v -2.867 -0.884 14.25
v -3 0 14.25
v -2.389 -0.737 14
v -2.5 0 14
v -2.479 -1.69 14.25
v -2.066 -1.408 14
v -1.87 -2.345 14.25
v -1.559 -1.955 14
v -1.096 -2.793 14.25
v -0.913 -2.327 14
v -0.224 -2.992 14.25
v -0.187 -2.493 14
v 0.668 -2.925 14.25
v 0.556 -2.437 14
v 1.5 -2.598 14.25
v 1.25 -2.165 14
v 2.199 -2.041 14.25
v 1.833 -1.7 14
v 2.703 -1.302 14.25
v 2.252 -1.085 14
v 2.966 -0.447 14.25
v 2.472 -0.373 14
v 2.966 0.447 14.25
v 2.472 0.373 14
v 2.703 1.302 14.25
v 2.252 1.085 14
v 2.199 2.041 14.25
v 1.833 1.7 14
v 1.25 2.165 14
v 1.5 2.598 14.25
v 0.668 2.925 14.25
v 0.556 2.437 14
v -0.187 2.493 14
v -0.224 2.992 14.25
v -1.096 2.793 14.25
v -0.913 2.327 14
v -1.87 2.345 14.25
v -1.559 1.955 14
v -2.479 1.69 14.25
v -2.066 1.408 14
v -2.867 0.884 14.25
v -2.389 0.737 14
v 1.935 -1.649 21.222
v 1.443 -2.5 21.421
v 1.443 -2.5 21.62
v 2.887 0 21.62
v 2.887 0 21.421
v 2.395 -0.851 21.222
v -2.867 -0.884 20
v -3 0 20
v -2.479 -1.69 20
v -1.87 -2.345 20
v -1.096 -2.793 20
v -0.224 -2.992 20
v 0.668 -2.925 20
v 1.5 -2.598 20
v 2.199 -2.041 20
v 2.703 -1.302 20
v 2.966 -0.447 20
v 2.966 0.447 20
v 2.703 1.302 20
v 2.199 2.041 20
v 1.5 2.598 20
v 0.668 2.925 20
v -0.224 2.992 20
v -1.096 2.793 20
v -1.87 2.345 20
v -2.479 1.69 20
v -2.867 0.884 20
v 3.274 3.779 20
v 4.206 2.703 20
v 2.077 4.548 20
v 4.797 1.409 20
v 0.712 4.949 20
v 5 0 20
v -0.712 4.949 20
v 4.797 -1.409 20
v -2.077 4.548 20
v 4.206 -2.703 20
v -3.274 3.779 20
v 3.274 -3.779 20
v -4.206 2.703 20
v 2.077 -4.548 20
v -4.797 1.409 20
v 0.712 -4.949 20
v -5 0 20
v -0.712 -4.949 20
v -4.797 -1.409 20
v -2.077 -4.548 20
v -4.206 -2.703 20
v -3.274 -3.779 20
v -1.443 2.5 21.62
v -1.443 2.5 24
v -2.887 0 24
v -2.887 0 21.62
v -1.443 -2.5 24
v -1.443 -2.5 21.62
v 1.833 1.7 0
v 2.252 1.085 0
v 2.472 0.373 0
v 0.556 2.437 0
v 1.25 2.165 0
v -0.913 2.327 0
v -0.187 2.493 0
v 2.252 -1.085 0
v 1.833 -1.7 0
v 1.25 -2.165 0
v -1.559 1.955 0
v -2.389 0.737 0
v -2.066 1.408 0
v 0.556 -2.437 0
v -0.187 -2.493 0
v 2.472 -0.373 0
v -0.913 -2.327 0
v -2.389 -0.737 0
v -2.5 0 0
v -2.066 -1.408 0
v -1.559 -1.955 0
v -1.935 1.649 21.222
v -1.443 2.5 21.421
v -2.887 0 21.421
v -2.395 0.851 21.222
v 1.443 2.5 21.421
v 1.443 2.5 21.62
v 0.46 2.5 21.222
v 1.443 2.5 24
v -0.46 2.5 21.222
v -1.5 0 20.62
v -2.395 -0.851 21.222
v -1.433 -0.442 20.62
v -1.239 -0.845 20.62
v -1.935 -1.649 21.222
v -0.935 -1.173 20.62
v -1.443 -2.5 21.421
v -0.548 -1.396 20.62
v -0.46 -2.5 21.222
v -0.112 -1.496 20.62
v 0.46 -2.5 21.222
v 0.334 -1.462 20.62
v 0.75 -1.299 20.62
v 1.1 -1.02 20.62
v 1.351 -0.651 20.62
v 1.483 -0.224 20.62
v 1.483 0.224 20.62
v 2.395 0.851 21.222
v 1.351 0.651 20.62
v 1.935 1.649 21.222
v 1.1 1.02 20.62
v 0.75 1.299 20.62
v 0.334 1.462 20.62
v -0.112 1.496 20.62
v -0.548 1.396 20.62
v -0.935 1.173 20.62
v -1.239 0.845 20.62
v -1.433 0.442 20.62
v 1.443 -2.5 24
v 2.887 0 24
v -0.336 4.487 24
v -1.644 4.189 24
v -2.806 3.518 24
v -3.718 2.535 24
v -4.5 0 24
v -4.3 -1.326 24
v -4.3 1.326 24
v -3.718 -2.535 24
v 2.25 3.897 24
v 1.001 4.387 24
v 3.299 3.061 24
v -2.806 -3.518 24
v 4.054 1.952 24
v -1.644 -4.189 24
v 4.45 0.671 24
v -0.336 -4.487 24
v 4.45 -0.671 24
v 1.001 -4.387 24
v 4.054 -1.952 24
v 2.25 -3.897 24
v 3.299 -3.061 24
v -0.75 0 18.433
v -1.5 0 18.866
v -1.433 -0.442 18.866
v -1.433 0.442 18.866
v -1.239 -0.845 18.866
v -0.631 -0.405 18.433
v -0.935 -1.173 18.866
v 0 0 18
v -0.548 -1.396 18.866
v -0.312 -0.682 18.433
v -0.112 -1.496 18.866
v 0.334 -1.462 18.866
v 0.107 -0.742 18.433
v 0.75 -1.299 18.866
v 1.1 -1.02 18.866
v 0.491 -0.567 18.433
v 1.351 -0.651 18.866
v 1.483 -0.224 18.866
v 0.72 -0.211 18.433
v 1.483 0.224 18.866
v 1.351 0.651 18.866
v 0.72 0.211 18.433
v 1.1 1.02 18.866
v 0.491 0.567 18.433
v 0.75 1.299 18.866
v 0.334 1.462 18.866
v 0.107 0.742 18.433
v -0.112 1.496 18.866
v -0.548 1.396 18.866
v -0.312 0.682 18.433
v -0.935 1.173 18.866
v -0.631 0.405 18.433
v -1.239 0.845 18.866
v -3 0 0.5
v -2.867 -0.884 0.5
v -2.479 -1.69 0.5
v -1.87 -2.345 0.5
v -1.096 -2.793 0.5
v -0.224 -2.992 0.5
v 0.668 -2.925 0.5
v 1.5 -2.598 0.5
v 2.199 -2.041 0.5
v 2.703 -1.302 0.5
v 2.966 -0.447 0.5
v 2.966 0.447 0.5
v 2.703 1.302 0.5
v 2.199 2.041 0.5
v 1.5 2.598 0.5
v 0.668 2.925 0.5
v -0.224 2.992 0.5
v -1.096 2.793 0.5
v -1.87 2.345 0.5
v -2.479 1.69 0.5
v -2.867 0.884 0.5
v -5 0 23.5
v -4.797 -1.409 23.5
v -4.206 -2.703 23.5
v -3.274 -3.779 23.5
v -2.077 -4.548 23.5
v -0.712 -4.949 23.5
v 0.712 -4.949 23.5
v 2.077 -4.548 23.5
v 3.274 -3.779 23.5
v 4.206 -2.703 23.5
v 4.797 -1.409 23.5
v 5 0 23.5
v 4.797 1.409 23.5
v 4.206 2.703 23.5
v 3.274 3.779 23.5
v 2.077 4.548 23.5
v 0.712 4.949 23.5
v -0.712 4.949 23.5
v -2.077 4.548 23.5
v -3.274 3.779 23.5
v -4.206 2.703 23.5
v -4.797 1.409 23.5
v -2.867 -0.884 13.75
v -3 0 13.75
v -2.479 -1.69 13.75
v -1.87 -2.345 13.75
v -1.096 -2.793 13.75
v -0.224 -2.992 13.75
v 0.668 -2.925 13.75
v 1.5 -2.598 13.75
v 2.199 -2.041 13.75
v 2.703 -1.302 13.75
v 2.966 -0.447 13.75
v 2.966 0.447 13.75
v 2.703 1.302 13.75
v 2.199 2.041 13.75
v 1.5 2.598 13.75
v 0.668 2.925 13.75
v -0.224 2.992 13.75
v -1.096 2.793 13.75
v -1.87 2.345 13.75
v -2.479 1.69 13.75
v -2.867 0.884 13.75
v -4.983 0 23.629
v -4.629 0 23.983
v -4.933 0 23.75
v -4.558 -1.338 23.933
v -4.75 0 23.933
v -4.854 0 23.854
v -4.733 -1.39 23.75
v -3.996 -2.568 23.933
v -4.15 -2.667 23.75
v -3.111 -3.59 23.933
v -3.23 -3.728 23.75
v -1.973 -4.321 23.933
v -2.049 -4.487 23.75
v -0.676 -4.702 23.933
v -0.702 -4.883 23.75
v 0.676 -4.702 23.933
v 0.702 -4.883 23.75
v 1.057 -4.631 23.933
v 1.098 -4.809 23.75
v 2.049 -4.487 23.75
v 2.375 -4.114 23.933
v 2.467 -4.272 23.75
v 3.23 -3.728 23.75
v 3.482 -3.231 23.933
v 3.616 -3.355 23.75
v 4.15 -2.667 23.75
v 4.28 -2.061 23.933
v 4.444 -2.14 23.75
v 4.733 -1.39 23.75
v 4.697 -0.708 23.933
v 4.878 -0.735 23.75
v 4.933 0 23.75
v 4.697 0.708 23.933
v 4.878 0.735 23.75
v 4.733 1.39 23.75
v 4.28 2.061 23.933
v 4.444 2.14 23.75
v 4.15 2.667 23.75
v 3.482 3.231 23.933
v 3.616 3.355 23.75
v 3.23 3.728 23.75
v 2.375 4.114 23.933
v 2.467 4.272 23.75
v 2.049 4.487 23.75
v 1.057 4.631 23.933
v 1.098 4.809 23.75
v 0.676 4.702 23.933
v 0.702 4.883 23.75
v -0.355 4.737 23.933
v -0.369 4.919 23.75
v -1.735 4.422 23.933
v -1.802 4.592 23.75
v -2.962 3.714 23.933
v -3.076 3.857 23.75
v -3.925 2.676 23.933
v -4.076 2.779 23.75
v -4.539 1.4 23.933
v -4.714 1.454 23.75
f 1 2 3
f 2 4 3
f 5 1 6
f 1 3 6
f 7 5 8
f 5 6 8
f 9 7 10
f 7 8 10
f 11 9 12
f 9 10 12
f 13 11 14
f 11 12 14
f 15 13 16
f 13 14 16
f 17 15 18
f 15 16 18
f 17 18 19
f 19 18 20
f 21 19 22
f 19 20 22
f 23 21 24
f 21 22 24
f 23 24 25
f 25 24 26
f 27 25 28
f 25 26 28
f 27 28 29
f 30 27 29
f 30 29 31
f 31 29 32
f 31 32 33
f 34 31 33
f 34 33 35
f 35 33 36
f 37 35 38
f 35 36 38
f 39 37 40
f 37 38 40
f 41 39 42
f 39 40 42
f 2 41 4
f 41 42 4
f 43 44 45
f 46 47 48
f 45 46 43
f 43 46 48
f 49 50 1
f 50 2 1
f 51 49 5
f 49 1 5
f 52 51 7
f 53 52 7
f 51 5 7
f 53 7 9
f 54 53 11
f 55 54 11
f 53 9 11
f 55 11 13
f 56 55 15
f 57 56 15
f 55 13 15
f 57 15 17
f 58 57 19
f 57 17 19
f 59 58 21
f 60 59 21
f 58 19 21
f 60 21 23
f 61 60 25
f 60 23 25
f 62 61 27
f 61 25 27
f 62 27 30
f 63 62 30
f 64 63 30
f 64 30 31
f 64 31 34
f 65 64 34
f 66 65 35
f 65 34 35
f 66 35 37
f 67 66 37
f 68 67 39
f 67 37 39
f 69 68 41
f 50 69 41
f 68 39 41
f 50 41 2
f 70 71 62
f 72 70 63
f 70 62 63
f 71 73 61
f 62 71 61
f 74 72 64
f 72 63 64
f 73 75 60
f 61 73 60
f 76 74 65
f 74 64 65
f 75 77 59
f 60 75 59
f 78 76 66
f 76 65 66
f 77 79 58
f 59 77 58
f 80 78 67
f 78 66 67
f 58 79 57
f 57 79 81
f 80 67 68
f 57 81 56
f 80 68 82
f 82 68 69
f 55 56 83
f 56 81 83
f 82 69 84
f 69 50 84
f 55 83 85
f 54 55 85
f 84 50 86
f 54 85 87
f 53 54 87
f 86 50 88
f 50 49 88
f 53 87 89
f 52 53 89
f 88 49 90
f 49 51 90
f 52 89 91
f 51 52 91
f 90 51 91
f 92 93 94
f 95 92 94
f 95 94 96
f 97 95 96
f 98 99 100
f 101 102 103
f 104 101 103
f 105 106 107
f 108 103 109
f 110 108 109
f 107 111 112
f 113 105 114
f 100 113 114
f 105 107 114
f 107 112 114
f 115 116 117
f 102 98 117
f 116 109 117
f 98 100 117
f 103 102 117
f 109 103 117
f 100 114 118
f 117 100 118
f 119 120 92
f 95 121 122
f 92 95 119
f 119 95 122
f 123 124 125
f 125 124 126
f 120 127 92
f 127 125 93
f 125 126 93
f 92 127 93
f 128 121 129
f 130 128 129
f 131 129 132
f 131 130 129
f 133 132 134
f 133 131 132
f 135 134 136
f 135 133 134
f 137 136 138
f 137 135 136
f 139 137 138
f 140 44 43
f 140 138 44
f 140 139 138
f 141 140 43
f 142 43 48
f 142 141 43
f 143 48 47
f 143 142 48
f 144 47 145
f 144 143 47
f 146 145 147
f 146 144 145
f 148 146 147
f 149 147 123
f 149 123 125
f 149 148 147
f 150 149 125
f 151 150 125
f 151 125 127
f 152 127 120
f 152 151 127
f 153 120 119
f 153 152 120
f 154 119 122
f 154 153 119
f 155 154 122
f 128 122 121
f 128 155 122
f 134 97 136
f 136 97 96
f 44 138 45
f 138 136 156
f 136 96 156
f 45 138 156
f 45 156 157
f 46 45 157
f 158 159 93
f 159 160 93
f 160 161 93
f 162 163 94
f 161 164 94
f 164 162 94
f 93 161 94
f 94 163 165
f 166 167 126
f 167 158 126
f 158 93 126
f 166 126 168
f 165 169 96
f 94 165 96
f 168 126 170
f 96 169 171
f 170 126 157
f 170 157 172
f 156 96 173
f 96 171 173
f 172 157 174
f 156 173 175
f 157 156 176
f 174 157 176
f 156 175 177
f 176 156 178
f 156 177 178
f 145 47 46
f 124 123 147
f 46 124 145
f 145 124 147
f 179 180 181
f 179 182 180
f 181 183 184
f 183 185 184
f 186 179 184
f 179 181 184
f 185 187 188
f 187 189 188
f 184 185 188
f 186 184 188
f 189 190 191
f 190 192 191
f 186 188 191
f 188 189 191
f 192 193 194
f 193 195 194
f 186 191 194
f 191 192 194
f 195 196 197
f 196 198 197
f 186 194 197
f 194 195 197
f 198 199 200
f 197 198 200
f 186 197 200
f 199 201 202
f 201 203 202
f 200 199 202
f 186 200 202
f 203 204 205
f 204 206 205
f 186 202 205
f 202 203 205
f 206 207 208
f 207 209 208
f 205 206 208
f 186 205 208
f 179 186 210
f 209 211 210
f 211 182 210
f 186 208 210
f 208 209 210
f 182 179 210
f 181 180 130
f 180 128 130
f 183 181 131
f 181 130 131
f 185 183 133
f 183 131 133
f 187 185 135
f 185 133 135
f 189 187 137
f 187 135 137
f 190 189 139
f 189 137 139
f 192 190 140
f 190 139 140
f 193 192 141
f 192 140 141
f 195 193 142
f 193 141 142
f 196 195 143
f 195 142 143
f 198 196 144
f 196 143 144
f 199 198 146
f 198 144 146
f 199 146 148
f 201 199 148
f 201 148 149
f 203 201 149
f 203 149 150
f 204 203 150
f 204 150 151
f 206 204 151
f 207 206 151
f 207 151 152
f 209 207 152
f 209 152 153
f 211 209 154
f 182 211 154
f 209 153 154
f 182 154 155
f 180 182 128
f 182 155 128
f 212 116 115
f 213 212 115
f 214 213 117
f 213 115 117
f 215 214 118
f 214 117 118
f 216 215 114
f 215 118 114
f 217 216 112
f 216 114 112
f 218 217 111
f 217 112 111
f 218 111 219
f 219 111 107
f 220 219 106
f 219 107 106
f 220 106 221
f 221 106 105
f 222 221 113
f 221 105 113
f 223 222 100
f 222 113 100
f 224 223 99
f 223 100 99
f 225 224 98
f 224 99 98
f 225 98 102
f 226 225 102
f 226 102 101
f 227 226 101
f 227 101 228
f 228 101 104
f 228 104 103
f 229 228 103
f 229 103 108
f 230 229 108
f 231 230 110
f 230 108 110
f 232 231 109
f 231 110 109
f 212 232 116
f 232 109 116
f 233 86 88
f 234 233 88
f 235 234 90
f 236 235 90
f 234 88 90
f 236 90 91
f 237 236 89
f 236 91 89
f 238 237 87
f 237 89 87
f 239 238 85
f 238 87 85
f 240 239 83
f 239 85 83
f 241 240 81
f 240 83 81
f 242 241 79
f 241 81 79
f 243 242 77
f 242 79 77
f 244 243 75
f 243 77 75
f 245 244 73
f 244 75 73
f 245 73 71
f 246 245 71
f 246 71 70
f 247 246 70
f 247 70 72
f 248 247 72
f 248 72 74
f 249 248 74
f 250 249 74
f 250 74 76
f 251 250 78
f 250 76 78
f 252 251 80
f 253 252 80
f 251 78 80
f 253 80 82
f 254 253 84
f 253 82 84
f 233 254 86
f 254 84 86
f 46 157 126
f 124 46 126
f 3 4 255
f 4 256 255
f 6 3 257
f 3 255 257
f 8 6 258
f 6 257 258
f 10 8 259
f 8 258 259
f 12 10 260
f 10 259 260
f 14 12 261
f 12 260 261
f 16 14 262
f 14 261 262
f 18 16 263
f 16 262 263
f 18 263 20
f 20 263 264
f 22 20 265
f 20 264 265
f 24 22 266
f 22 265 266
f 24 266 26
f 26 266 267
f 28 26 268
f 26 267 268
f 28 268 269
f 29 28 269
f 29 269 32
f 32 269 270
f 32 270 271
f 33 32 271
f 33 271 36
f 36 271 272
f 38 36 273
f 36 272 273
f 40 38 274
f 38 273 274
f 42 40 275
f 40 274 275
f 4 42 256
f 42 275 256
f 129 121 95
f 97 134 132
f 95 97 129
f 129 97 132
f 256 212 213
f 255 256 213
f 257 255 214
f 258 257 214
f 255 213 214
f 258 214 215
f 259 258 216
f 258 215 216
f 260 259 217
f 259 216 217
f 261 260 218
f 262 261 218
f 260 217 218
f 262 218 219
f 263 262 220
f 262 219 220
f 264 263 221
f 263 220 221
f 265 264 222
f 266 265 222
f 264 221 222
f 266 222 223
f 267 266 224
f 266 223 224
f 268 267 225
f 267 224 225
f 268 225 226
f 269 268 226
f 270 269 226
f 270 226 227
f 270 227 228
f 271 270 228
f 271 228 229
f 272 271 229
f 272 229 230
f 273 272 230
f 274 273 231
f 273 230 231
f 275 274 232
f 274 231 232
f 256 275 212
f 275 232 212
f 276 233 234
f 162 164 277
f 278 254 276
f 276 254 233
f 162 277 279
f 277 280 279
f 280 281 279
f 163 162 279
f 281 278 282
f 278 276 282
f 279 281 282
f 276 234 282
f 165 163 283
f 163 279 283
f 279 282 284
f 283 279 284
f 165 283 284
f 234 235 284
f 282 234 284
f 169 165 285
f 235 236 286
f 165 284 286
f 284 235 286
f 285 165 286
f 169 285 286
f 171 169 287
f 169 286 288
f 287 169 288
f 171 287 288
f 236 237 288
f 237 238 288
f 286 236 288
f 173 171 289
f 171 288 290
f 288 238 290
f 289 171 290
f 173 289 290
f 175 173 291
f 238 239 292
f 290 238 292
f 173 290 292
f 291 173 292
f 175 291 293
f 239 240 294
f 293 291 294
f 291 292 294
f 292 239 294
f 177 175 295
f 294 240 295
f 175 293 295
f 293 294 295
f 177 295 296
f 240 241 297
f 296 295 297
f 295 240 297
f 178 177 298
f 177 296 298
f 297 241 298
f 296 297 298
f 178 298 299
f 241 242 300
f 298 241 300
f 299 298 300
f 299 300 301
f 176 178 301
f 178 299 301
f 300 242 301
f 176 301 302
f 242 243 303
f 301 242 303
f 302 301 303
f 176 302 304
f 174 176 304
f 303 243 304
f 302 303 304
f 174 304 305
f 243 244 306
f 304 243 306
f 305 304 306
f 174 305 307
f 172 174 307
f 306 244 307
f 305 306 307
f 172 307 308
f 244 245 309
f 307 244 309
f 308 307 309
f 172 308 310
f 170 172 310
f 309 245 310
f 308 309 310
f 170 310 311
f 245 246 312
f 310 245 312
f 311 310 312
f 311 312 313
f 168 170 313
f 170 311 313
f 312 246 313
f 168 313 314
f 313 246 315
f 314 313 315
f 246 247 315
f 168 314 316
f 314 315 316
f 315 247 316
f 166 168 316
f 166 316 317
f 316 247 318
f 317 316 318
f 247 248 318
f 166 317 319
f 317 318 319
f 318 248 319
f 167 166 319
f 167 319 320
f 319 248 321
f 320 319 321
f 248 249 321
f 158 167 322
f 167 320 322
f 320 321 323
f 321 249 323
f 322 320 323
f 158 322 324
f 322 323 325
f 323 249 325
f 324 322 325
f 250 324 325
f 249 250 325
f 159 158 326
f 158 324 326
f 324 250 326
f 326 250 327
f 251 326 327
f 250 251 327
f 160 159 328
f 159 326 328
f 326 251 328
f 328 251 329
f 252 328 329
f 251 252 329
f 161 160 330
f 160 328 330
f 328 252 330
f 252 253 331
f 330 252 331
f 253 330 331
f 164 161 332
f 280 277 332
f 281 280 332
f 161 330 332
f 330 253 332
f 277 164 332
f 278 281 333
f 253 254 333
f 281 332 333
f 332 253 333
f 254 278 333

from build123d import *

# Parameters (mm, degrees)
F2_R     = 0.5
F3_SIZE  = 0.5
F5_DEPTH = 2.38


# Not quite as in the source:
# - a fillet or chamfer that OpenCascade refuses, or shapes differently, is made with other operations: its cross-section is extruded or revolved along the edge and cut away or added


with BuildPart() as f1:
    # F0 (on Front) → F1 (revolve)
    with BuildSketch(Plane.XZ):
        Polygon((-3, 0), (0, 0), (0, 18), (-1.5, 18.8660254038), (-1.5, 24), (-5, 24), (-5, 20), (-3, 20), (-3, 14.25), (-2.5, 14), (-3, 13.75), align=None)
    revolve(axis=Axis((0, 0, 18.332445994), (0, 0, 1)))

    # F2
    f2_edges = [f1.edges().sort_by_distance(p)[0] for p in [
        (5, 0, 24),
    ]]
    fillet(f2_edges, radius=F2_R)

    # F3
    f3_edges = [f1.edges().sort_by_distance(p)[0] for p in [
        (3, 0, 0),
    ]]
    chamfer(f3_edges, length=F3_SIZE)

    # F4 (on face) → F5 (cut)
    with BuildSketch(Plane.XY.offset(24)):
        Polygon((-1.443375673, -2.5), (1.443375673, -2.5), (2.8867513459, 0), (1.443375673, 2.5), (-1.443375673, 2.5), (-2.8867513459, 0), align=None)
    extrude(amount=-F5_DEPTH, mode=Mode.SUBTRACT)

    # F6: chamfer of 1 x 1.7320508076 on 1 edges, made by hand


with BuildPart() as f6_tool2:
    # F6_s3 → F6_t4 (revolve)
    with BuildSketch(Plane.XZ):
        Polygon((-3.2320508076, 21.62), (-1.5, 20.62), (-1.5, 21.62), align=None)
    revolve(axis=Axis((0, 0, 21.62), (0, 0, 1)))

    split(bisect_by=Plane(origin=(-2.1650635095, 1.25, 0), x_dir=(0, 0, 1), z_dir=(0.8660254038, -0.5, 0)), keep=Keep.TOP)

    split(bisect_by=Plane.XZ.offset(-2.5), keep=Keep.TOP)

    split(bisect_by=Plane(origin=(2.1650635095, 1.25, 0), x_dir=(0, 0, 1), z_dir=(-0.8660254038, -0.5, 0)), keep=Keep.TOP)

    split(bisect_by=Plane(origin=(2.1650635095, -1.25, 0), x_dir=(0, 0, 1), z_dir=(-0.8660254038, 0.5, 0)), keep=Keep.TOP)

    split(bisect_by=Plane.XZ.offset(2.5), keep=Keep.BOTTOM)

    split(bisect_by=Plane(origin=(-2.1650635095, -1.25, 0), x_dir=(0, 0, 1), z_dir=(0.8660254038, 0.5, 0)), keep=Keep.TOP)


with BuildPart() as f1_1:
    add(f1.part)

    # F6_t1: cut F6_tool2
    add(f6_tool2.part, mode=Mode.SUBTRACT)


solid = f1_1.part
